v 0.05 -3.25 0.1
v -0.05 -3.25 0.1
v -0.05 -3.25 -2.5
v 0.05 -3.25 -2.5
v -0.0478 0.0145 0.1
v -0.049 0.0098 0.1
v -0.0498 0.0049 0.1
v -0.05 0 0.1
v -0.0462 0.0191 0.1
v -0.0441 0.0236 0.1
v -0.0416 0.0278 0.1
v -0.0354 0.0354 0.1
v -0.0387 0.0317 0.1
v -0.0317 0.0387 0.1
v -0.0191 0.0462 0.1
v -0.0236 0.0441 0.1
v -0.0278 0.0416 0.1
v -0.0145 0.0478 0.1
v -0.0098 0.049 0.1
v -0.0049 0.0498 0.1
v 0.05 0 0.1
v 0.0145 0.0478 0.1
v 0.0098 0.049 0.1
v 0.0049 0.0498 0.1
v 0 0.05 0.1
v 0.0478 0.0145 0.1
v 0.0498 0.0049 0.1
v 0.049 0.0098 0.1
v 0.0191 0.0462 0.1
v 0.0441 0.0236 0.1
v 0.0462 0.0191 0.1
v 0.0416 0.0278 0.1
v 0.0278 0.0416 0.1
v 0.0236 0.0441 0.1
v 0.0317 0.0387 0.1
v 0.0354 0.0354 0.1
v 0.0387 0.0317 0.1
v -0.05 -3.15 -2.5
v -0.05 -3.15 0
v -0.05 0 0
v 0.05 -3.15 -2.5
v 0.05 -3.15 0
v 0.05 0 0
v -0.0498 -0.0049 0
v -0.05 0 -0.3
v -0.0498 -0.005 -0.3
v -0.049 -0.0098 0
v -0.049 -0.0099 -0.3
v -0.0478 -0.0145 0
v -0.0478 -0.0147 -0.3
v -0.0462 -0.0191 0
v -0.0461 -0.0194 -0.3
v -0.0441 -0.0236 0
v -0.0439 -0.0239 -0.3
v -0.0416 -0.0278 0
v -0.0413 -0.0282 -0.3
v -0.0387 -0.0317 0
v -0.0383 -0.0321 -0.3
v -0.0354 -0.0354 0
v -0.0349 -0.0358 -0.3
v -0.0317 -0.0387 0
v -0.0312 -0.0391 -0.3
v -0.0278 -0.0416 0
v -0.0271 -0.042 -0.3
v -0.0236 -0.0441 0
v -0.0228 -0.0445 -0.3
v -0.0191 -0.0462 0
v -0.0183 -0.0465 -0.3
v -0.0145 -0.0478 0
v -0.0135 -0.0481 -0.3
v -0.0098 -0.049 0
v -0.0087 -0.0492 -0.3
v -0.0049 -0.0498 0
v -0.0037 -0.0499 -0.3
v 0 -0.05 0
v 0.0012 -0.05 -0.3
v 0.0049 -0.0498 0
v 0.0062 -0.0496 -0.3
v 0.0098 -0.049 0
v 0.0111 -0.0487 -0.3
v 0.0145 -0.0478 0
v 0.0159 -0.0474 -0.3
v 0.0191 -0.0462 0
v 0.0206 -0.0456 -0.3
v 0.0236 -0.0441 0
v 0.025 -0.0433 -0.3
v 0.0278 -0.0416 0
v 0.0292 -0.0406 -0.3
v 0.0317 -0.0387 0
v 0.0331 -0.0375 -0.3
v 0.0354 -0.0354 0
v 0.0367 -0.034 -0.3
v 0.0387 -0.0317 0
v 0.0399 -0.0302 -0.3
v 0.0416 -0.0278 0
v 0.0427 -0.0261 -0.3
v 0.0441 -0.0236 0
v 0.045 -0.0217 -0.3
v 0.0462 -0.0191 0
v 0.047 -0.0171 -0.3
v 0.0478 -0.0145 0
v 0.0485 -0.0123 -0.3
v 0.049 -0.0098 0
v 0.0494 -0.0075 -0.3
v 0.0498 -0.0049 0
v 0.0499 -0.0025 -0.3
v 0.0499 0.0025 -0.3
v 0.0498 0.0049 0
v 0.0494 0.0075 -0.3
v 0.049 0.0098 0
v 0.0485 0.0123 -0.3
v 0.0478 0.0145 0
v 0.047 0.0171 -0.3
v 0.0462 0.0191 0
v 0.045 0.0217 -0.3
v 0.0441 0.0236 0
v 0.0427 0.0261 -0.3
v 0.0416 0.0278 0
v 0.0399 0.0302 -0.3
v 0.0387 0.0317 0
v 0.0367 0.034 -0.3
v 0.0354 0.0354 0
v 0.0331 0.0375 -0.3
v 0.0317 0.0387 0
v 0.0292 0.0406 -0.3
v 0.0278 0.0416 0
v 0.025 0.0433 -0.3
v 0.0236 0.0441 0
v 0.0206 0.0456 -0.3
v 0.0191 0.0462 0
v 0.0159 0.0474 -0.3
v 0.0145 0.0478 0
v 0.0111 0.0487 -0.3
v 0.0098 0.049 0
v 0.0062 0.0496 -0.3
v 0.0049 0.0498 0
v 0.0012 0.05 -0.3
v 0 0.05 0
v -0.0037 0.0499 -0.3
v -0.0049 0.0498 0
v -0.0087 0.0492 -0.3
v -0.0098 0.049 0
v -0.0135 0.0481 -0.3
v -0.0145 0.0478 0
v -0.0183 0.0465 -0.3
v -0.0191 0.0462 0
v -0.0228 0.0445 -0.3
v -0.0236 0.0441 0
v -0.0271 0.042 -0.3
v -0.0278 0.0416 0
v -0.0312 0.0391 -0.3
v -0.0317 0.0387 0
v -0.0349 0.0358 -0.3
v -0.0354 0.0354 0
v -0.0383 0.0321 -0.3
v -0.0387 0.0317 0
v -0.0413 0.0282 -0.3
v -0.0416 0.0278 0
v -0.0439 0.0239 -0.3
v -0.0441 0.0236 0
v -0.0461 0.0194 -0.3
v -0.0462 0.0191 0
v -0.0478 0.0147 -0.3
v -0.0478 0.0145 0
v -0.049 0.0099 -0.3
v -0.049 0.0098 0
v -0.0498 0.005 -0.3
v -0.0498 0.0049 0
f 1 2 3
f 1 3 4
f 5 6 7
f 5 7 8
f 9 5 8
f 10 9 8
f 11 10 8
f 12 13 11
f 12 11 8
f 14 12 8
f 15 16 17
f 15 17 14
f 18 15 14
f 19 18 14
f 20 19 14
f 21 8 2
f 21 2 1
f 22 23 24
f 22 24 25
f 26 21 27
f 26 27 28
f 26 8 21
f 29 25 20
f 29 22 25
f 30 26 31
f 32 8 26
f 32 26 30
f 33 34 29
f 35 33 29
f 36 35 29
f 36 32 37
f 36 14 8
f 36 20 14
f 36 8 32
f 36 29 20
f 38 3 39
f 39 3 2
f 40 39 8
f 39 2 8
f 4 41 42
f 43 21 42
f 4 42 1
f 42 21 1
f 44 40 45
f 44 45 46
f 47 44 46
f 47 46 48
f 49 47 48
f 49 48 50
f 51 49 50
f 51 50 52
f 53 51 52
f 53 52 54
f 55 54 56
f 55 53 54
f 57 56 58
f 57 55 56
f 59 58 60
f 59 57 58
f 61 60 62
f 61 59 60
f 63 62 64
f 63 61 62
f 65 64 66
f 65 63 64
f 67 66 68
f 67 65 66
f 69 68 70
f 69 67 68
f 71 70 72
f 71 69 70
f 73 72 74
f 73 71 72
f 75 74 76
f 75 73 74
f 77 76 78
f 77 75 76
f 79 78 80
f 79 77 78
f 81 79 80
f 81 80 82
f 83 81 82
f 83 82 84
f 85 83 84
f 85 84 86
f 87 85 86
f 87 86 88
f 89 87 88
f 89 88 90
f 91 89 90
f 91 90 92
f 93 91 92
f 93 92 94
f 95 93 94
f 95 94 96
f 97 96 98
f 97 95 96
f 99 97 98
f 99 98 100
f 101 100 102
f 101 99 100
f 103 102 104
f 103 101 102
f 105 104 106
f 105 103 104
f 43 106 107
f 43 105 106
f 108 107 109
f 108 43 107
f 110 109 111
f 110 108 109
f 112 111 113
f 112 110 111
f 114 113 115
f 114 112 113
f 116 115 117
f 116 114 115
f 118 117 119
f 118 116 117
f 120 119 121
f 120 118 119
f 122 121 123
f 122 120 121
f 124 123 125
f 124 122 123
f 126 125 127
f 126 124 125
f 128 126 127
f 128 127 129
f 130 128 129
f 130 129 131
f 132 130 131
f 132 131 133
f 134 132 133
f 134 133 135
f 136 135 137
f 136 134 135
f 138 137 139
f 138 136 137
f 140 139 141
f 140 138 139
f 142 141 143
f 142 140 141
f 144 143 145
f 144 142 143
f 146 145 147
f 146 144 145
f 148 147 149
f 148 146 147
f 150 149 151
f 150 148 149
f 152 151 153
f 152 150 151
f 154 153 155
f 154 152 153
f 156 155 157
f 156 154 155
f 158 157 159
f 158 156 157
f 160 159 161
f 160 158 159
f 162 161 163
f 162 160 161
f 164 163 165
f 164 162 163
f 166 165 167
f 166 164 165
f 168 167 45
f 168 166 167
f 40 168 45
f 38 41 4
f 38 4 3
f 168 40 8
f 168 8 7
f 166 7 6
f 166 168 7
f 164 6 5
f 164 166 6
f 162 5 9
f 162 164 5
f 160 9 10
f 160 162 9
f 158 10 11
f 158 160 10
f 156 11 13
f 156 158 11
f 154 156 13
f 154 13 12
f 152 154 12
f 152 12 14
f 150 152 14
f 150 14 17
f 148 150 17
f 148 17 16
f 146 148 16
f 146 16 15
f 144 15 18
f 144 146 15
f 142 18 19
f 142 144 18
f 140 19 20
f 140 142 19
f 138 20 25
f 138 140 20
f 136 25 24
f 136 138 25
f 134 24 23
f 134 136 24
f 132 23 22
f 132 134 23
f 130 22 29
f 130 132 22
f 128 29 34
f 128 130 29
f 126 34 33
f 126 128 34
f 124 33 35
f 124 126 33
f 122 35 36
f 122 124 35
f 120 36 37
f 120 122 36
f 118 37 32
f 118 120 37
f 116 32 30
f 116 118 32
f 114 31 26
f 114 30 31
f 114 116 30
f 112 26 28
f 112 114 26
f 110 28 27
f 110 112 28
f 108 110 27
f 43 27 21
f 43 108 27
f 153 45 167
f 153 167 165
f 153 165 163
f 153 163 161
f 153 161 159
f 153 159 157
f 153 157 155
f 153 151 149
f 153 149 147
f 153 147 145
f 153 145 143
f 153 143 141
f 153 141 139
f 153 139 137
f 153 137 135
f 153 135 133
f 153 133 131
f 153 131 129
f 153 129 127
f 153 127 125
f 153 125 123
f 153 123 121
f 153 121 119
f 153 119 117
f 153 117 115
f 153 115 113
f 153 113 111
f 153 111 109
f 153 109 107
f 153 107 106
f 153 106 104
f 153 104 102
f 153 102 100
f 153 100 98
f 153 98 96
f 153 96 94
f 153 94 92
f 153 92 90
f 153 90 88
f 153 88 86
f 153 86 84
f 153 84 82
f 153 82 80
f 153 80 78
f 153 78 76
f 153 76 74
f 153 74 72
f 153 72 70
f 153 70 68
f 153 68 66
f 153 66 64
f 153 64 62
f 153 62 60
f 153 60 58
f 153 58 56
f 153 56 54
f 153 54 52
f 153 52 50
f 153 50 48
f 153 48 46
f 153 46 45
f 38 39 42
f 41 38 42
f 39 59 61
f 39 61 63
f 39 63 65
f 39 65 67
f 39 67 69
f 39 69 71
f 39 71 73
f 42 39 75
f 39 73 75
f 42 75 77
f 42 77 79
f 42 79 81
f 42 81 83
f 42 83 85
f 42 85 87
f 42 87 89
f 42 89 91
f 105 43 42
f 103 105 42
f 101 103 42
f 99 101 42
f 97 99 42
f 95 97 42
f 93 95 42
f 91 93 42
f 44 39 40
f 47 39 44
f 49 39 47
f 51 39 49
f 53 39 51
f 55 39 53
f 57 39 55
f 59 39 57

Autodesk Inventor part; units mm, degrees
ref_plane "YZ Plane" through (0, 0, 0) normal (1, 0, 0) x (0, 1, 0)
ref_plane "XZ Plane" through (0, 0, 0) normal (0, 1, 0) x (-1, 0, 0)
ref_plane "XY Plane" through (0, 0, 0) normal (0, 0, 1) x (1, 0, 0)
sketch "Sketch1" plane through (0, 0, 0) normal (0, 0, 1) x (1, 0, 0)
  line L0 (0, 0) -> (0, -3.2)
  circle A0 centre (0, 0) radius 0.05
  line L1 (-0.05, -3.25) -> (0.05, -3.25)
  line L2 (0.05, -3.25) -> (0.05, -3.15)
  line L3 (0.05, -3.15) -> (-0.05, -3.15)
  line L4 (-0.05, -3.15) -> (-0.05, -3.25)
  line L5 (-0.05, -3.25) -> (0.05, -3.15) construction
  line L6 (0.05, -3.25) -> (-0.05, -3.15) construction
  line L7 (0.05, -3.15) -> (0.05, 0)
  line L8 (-0.05, -3.15) -> (-0.05, 0)
  dimension "d1" = 0.1
  dimension "d0" = 3.2
  dimension "d2" = 0.1
  dimension "d3" = 0.1
extrude "Extrusion1" add sketch "Sketch1" along normal blind 0.1
sketch "Sketch2" plane through (0, 0, 0) normal (0, 0, -1) x (-1, 0, 0)
  circle A0 centre (0, 0) radius 0.05
  dimension "d6" = 0.1
extrude "Extrusion2" add sketch "Sketch2" along normal blind 0.3
sketch "Sketch3" plane through (0, 0, 0) normal (0, 0, -1) x (-1, 0, 0)
  line L0 (0.05, -3.25) -> (-0.05, -3.25) projected
  line L1 (-0.05, -3.25) -> (0.05, -3.25)
  line L2 (0.05, -3.25) -> (0.05, -3.15)
  line L3 (0.05, 0) -> (0.05, -3.25) projected
  line L4 (0.05, -3.15) -> (-0.05, -3.15)
  line L5 (-0.05, -3.15) -> (-0.05, -3.25)
  point P0 (0, 0)
  dimension "d9" = 0.1
  dimension "d10" = 0.1
extrude "Extrusion3" add sketch "Sketch3" along normal blind 2.5
properties part number "Bone14_9_Fix"
